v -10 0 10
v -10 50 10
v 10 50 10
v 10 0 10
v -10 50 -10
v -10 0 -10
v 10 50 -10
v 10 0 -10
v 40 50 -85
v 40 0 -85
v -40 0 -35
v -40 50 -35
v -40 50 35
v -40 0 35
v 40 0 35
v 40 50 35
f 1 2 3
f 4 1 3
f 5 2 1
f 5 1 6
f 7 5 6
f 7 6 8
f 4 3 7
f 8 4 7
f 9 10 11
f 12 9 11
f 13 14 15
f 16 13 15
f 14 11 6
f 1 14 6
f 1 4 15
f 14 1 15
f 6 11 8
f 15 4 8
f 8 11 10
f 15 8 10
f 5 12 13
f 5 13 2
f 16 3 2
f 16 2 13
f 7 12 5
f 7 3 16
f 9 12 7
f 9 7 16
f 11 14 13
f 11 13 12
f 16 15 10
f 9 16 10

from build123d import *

# Parameters (mm, degrees)
SKETCH1_W           = 80
SKETCH1_H           = 70
BOSS_EXTRUDE1_DEPTH = 50
SKETCH2_W           = 20
SKETCH2_H           = 20
CUT_EXTRUDE1_DEPTH  = 51


with BuildPart() as part:
    # Sketch1 → Boss-Extrude1 (new body)
    with BuildSketch(Plane(origin=(0, 0, 0), x_dir=(1, 0, 0), z_dir=(0, 1, 0))):
        Rectangle(SKETCH1_W, SKETCH1_H)
        Polygon((40, 35), (40, 85), (-40, 35), align=None)
    extrude(amount=BOSS_EXTRUDE1_DEPTH)

    # Sketch2 → Cut-Extrude1 (cut, through all)
    with BuildSketch(Plane(origin=(0, 50, 0), x_dir=(1, 0, 0), z_dir=(0, 1, 0))):
        Rectangle(SKETCH2_W, SKETCH2_H)
    extrude(amount=-CUT_EXTRUDE1_DEPTH, mode=Mode.SUBTRACT)


solid = part.part
